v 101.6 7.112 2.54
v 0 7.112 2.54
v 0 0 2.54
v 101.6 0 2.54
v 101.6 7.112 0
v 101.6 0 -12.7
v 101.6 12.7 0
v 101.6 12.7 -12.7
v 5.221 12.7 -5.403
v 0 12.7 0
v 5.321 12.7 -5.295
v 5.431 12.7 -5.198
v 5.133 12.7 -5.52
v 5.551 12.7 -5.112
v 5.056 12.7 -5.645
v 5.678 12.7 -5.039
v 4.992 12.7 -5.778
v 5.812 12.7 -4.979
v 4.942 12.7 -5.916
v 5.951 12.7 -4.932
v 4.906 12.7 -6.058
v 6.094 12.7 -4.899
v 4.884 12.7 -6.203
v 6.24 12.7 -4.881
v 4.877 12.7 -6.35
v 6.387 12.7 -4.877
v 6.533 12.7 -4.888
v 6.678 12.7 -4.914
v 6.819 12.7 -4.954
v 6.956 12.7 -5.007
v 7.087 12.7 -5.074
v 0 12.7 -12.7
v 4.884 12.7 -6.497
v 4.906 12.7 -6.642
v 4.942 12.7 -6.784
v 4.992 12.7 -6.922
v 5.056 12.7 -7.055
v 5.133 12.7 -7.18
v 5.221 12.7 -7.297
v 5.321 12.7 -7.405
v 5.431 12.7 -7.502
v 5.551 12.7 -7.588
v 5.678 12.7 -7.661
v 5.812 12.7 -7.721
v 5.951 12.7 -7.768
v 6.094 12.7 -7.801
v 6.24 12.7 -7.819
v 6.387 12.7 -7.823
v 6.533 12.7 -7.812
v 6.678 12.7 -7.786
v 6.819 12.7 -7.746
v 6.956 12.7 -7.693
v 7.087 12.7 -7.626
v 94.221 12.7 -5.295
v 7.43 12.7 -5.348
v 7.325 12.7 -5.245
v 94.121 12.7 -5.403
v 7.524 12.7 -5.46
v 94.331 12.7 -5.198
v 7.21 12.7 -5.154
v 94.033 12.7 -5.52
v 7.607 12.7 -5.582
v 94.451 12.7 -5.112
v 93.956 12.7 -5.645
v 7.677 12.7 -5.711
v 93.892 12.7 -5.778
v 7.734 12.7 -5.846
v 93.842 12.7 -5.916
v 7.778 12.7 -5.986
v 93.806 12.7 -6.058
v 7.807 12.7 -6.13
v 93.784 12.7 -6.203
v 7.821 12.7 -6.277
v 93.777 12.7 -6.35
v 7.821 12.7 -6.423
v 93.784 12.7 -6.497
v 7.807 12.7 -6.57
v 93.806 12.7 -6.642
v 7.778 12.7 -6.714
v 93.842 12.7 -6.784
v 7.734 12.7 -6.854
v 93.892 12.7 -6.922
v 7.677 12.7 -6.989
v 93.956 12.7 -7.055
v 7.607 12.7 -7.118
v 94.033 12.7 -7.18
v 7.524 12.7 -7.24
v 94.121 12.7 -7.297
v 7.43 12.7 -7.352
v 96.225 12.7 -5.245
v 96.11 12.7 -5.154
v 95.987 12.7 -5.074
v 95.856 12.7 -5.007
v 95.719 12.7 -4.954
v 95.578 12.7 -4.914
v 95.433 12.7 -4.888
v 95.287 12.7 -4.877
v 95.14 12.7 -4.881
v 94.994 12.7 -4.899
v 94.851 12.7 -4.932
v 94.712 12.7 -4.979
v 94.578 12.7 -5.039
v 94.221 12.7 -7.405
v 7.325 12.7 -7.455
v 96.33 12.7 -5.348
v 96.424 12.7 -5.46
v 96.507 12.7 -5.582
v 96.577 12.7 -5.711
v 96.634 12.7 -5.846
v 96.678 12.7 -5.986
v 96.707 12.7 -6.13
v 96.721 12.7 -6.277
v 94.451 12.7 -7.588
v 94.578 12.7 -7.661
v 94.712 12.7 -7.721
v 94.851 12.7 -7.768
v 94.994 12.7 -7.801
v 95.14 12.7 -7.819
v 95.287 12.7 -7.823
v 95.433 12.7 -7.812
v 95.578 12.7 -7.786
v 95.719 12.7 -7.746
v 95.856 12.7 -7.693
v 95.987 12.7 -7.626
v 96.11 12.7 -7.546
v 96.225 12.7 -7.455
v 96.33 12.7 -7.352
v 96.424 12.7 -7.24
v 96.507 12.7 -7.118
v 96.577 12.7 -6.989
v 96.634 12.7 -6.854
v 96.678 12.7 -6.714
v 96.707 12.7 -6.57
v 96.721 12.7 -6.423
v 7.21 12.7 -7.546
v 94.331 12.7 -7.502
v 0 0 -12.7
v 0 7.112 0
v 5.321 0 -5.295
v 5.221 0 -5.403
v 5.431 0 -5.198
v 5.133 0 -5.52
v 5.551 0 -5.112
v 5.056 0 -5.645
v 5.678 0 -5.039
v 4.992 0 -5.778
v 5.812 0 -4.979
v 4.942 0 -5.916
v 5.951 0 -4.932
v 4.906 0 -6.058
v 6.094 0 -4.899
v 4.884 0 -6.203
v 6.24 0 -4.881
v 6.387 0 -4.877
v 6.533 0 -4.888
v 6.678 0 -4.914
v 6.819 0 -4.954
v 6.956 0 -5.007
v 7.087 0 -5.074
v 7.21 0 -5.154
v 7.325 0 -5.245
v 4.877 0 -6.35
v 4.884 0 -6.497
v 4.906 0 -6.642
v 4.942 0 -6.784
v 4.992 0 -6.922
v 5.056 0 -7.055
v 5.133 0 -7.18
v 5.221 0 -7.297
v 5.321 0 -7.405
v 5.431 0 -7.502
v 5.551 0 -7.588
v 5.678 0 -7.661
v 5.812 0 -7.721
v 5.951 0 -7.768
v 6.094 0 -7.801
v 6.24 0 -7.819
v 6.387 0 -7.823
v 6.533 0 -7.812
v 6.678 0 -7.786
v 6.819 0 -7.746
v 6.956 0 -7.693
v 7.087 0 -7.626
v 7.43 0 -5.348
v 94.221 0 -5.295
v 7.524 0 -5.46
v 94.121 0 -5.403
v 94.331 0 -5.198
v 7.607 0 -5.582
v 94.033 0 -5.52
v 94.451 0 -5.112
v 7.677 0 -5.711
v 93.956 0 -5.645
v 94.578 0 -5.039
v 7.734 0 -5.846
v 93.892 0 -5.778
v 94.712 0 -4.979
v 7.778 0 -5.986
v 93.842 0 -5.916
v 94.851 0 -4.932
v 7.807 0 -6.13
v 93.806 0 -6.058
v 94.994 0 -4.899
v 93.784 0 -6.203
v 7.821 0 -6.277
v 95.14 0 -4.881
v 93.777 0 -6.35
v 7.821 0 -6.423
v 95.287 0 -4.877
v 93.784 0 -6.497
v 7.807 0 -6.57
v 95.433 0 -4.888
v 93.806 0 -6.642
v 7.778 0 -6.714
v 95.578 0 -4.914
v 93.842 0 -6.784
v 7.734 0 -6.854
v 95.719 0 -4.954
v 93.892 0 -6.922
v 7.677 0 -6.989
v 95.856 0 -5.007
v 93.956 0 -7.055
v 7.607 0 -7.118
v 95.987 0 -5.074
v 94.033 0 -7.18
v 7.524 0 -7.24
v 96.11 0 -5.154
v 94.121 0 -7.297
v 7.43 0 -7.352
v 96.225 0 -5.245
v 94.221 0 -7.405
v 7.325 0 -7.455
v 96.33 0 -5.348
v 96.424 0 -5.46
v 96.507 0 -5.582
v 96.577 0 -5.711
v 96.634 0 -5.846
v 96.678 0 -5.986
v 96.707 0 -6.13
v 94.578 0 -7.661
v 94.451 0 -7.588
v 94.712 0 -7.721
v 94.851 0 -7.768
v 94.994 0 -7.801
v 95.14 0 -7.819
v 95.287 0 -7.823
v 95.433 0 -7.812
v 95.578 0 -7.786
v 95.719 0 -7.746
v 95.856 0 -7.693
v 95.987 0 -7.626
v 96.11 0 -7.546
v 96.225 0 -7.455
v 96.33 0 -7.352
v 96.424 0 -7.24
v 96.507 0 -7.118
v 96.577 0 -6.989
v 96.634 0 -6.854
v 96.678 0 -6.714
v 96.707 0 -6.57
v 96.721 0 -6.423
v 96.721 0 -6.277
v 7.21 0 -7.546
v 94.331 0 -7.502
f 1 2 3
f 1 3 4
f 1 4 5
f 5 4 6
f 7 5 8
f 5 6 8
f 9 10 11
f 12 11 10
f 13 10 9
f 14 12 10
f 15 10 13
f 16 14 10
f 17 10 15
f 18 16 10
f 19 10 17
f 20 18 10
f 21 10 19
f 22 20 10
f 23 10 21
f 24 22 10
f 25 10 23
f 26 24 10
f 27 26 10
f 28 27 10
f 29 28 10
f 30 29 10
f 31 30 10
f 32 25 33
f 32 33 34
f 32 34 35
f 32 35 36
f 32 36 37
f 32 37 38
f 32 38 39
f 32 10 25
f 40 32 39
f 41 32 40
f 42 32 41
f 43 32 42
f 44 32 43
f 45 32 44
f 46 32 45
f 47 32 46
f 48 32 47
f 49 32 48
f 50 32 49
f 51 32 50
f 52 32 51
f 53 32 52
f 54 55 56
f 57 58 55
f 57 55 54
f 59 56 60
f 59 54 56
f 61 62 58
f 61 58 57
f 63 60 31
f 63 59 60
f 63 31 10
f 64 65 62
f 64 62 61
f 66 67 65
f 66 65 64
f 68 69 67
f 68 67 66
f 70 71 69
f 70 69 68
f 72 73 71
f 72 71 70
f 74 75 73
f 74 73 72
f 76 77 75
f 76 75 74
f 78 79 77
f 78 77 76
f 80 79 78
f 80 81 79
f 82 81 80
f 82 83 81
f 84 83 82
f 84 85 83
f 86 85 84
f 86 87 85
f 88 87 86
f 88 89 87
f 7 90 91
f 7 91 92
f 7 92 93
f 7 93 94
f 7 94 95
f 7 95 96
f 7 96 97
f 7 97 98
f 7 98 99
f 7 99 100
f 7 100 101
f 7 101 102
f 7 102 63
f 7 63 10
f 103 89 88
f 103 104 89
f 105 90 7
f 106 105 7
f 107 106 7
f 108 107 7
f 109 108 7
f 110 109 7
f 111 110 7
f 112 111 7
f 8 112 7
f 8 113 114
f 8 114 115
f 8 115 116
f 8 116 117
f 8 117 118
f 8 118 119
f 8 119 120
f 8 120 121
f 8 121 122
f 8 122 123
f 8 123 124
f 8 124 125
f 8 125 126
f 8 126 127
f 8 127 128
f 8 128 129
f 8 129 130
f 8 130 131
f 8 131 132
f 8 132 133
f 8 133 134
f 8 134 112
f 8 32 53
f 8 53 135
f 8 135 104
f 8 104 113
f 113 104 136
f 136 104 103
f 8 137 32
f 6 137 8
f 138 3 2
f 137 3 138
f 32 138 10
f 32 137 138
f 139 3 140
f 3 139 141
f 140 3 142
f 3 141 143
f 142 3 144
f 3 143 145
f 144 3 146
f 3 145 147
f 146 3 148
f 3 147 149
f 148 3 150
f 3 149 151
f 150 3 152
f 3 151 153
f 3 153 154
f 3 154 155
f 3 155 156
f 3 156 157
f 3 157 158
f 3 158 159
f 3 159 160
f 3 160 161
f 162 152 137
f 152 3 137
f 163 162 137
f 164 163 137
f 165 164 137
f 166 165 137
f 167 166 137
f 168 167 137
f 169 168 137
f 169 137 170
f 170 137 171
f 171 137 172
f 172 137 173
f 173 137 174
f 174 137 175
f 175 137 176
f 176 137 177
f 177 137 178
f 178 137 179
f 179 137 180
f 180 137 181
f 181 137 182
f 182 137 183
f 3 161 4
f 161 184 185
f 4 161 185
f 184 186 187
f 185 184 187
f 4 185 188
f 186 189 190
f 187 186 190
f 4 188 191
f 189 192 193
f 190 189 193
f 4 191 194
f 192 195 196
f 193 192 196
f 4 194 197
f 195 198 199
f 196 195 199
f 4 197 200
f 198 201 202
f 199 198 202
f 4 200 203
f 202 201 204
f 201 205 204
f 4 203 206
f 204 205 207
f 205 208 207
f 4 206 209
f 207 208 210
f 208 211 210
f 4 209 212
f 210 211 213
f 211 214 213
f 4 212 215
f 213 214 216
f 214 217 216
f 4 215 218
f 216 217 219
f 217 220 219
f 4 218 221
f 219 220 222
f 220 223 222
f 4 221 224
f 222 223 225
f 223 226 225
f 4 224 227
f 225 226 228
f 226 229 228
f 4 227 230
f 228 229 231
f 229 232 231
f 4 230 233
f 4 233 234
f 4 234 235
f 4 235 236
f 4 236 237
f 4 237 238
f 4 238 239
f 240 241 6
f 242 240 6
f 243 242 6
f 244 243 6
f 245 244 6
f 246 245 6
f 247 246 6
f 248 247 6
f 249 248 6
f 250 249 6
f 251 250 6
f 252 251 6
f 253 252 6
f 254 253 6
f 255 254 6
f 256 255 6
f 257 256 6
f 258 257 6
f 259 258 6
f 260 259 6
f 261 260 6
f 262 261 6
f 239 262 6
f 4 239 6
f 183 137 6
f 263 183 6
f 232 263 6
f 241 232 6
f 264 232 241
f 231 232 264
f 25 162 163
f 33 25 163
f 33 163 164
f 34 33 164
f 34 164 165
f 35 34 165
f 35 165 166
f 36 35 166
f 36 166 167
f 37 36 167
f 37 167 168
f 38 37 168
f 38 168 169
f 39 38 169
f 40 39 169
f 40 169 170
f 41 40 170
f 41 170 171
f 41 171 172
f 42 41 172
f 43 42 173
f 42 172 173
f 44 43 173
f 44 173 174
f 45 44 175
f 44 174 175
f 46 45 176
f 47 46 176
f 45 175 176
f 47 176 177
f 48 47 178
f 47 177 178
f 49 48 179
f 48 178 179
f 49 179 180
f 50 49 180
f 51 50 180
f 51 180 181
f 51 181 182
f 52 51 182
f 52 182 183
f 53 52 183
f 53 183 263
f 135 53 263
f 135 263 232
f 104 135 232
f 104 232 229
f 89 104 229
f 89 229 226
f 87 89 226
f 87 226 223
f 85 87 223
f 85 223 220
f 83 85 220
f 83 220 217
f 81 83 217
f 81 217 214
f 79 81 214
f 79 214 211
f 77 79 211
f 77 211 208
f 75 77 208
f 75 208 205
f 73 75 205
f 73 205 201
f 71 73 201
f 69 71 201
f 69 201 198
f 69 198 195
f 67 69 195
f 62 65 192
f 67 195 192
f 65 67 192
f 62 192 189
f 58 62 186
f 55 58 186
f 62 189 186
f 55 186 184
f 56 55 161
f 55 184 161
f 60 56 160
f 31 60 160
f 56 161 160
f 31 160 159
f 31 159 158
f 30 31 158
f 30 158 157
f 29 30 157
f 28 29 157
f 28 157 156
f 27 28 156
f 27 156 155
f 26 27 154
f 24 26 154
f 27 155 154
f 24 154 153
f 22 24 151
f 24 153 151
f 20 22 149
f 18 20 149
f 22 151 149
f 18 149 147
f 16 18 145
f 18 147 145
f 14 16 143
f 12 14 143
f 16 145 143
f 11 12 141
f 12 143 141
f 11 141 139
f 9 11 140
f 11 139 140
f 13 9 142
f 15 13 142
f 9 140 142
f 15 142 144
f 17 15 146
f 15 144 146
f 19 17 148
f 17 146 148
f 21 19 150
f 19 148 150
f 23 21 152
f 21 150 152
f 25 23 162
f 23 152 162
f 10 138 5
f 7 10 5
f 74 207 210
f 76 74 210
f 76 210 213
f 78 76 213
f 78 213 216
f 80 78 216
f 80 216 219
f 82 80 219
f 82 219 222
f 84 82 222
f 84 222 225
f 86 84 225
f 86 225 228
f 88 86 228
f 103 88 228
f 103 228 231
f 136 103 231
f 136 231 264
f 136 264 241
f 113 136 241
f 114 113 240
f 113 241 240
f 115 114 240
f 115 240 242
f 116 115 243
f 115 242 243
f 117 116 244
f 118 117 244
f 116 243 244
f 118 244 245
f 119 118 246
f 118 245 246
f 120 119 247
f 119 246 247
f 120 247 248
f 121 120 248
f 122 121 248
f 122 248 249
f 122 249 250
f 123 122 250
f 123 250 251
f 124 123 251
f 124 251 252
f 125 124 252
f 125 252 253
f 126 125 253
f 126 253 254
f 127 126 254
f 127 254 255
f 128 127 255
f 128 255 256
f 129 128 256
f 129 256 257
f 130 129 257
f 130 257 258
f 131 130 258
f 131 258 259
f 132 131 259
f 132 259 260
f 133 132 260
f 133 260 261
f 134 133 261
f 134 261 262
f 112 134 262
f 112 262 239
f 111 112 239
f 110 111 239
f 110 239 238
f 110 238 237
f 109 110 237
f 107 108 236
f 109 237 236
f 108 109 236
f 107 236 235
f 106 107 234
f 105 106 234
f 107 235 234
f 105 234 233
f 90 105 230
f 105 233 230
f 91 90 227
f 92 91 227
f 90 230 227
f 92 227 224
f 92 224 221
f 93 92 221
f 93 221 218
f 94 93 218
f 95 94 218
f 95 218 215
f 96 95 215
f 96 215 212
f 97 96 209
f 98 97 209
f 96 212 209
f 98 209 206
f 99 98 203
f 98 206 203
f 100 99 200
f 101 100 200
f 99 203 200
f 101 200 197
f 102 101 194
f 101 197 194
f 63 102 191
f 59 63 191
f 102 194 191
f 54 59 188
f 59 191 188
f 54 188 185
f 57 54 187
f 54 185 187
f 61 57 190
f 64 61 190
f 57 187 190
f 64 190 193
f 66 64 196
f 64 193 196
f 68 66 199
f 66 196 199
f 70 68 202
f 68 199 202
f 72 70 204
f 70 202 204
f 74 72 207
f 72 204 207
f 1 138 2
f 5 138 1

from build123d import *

# Parameters (mm, degrees)
SKETCH1_W                   = 101.6
SKETCH1_H                   = 12.7
BOSS_EXTRUDE1_DEPTH         = 12.7
F_32_0_116_DIAMETER_HOLE1_D = 2.9464
SKETCH5_W                   = 101.6
SKETCH5_H                   = 7.112
BOSS_EXTRUDE2_DEPTH         = 2.54


with BuildPart() as part:
    # Sketch1 → Boss-Extrude1 (new body)
    with BuildSketch(Plane(origin=(0, 0, 0), x_dir=(1, 0, 0), z_dir=(0, 1, 0))):
        with Locations((50.8, 6.35)):
            Rectangle(SKETCH1_W, SKETCH1_H)
    extrude(amount=BOSS_EXTRUDE1_DEPTH)

    # #32 (0.116) Diameter Hole1 (through all)
    with Locations(Plane(origin=(0, 12.7, 0), x_dir=(1, 0, 0), z_dir=(0, 1, 0))):
        with Locations((6.35, 6.35), (95.25, 6.35)):
            Hole(F_32_0_116_DIAMETER_HOLE1_D / 2)

    # Sketch5 → Boss-Extrude2 (add)
    with BuildSketch(Plane.XY):
        with Locations((50.8, 3.556)):
            Rectangle(SKETCH5_W, SKETCH5_H)
    extrude(amount=BOSS_EXTRUDE2_DEPTH)


solid = part.part
